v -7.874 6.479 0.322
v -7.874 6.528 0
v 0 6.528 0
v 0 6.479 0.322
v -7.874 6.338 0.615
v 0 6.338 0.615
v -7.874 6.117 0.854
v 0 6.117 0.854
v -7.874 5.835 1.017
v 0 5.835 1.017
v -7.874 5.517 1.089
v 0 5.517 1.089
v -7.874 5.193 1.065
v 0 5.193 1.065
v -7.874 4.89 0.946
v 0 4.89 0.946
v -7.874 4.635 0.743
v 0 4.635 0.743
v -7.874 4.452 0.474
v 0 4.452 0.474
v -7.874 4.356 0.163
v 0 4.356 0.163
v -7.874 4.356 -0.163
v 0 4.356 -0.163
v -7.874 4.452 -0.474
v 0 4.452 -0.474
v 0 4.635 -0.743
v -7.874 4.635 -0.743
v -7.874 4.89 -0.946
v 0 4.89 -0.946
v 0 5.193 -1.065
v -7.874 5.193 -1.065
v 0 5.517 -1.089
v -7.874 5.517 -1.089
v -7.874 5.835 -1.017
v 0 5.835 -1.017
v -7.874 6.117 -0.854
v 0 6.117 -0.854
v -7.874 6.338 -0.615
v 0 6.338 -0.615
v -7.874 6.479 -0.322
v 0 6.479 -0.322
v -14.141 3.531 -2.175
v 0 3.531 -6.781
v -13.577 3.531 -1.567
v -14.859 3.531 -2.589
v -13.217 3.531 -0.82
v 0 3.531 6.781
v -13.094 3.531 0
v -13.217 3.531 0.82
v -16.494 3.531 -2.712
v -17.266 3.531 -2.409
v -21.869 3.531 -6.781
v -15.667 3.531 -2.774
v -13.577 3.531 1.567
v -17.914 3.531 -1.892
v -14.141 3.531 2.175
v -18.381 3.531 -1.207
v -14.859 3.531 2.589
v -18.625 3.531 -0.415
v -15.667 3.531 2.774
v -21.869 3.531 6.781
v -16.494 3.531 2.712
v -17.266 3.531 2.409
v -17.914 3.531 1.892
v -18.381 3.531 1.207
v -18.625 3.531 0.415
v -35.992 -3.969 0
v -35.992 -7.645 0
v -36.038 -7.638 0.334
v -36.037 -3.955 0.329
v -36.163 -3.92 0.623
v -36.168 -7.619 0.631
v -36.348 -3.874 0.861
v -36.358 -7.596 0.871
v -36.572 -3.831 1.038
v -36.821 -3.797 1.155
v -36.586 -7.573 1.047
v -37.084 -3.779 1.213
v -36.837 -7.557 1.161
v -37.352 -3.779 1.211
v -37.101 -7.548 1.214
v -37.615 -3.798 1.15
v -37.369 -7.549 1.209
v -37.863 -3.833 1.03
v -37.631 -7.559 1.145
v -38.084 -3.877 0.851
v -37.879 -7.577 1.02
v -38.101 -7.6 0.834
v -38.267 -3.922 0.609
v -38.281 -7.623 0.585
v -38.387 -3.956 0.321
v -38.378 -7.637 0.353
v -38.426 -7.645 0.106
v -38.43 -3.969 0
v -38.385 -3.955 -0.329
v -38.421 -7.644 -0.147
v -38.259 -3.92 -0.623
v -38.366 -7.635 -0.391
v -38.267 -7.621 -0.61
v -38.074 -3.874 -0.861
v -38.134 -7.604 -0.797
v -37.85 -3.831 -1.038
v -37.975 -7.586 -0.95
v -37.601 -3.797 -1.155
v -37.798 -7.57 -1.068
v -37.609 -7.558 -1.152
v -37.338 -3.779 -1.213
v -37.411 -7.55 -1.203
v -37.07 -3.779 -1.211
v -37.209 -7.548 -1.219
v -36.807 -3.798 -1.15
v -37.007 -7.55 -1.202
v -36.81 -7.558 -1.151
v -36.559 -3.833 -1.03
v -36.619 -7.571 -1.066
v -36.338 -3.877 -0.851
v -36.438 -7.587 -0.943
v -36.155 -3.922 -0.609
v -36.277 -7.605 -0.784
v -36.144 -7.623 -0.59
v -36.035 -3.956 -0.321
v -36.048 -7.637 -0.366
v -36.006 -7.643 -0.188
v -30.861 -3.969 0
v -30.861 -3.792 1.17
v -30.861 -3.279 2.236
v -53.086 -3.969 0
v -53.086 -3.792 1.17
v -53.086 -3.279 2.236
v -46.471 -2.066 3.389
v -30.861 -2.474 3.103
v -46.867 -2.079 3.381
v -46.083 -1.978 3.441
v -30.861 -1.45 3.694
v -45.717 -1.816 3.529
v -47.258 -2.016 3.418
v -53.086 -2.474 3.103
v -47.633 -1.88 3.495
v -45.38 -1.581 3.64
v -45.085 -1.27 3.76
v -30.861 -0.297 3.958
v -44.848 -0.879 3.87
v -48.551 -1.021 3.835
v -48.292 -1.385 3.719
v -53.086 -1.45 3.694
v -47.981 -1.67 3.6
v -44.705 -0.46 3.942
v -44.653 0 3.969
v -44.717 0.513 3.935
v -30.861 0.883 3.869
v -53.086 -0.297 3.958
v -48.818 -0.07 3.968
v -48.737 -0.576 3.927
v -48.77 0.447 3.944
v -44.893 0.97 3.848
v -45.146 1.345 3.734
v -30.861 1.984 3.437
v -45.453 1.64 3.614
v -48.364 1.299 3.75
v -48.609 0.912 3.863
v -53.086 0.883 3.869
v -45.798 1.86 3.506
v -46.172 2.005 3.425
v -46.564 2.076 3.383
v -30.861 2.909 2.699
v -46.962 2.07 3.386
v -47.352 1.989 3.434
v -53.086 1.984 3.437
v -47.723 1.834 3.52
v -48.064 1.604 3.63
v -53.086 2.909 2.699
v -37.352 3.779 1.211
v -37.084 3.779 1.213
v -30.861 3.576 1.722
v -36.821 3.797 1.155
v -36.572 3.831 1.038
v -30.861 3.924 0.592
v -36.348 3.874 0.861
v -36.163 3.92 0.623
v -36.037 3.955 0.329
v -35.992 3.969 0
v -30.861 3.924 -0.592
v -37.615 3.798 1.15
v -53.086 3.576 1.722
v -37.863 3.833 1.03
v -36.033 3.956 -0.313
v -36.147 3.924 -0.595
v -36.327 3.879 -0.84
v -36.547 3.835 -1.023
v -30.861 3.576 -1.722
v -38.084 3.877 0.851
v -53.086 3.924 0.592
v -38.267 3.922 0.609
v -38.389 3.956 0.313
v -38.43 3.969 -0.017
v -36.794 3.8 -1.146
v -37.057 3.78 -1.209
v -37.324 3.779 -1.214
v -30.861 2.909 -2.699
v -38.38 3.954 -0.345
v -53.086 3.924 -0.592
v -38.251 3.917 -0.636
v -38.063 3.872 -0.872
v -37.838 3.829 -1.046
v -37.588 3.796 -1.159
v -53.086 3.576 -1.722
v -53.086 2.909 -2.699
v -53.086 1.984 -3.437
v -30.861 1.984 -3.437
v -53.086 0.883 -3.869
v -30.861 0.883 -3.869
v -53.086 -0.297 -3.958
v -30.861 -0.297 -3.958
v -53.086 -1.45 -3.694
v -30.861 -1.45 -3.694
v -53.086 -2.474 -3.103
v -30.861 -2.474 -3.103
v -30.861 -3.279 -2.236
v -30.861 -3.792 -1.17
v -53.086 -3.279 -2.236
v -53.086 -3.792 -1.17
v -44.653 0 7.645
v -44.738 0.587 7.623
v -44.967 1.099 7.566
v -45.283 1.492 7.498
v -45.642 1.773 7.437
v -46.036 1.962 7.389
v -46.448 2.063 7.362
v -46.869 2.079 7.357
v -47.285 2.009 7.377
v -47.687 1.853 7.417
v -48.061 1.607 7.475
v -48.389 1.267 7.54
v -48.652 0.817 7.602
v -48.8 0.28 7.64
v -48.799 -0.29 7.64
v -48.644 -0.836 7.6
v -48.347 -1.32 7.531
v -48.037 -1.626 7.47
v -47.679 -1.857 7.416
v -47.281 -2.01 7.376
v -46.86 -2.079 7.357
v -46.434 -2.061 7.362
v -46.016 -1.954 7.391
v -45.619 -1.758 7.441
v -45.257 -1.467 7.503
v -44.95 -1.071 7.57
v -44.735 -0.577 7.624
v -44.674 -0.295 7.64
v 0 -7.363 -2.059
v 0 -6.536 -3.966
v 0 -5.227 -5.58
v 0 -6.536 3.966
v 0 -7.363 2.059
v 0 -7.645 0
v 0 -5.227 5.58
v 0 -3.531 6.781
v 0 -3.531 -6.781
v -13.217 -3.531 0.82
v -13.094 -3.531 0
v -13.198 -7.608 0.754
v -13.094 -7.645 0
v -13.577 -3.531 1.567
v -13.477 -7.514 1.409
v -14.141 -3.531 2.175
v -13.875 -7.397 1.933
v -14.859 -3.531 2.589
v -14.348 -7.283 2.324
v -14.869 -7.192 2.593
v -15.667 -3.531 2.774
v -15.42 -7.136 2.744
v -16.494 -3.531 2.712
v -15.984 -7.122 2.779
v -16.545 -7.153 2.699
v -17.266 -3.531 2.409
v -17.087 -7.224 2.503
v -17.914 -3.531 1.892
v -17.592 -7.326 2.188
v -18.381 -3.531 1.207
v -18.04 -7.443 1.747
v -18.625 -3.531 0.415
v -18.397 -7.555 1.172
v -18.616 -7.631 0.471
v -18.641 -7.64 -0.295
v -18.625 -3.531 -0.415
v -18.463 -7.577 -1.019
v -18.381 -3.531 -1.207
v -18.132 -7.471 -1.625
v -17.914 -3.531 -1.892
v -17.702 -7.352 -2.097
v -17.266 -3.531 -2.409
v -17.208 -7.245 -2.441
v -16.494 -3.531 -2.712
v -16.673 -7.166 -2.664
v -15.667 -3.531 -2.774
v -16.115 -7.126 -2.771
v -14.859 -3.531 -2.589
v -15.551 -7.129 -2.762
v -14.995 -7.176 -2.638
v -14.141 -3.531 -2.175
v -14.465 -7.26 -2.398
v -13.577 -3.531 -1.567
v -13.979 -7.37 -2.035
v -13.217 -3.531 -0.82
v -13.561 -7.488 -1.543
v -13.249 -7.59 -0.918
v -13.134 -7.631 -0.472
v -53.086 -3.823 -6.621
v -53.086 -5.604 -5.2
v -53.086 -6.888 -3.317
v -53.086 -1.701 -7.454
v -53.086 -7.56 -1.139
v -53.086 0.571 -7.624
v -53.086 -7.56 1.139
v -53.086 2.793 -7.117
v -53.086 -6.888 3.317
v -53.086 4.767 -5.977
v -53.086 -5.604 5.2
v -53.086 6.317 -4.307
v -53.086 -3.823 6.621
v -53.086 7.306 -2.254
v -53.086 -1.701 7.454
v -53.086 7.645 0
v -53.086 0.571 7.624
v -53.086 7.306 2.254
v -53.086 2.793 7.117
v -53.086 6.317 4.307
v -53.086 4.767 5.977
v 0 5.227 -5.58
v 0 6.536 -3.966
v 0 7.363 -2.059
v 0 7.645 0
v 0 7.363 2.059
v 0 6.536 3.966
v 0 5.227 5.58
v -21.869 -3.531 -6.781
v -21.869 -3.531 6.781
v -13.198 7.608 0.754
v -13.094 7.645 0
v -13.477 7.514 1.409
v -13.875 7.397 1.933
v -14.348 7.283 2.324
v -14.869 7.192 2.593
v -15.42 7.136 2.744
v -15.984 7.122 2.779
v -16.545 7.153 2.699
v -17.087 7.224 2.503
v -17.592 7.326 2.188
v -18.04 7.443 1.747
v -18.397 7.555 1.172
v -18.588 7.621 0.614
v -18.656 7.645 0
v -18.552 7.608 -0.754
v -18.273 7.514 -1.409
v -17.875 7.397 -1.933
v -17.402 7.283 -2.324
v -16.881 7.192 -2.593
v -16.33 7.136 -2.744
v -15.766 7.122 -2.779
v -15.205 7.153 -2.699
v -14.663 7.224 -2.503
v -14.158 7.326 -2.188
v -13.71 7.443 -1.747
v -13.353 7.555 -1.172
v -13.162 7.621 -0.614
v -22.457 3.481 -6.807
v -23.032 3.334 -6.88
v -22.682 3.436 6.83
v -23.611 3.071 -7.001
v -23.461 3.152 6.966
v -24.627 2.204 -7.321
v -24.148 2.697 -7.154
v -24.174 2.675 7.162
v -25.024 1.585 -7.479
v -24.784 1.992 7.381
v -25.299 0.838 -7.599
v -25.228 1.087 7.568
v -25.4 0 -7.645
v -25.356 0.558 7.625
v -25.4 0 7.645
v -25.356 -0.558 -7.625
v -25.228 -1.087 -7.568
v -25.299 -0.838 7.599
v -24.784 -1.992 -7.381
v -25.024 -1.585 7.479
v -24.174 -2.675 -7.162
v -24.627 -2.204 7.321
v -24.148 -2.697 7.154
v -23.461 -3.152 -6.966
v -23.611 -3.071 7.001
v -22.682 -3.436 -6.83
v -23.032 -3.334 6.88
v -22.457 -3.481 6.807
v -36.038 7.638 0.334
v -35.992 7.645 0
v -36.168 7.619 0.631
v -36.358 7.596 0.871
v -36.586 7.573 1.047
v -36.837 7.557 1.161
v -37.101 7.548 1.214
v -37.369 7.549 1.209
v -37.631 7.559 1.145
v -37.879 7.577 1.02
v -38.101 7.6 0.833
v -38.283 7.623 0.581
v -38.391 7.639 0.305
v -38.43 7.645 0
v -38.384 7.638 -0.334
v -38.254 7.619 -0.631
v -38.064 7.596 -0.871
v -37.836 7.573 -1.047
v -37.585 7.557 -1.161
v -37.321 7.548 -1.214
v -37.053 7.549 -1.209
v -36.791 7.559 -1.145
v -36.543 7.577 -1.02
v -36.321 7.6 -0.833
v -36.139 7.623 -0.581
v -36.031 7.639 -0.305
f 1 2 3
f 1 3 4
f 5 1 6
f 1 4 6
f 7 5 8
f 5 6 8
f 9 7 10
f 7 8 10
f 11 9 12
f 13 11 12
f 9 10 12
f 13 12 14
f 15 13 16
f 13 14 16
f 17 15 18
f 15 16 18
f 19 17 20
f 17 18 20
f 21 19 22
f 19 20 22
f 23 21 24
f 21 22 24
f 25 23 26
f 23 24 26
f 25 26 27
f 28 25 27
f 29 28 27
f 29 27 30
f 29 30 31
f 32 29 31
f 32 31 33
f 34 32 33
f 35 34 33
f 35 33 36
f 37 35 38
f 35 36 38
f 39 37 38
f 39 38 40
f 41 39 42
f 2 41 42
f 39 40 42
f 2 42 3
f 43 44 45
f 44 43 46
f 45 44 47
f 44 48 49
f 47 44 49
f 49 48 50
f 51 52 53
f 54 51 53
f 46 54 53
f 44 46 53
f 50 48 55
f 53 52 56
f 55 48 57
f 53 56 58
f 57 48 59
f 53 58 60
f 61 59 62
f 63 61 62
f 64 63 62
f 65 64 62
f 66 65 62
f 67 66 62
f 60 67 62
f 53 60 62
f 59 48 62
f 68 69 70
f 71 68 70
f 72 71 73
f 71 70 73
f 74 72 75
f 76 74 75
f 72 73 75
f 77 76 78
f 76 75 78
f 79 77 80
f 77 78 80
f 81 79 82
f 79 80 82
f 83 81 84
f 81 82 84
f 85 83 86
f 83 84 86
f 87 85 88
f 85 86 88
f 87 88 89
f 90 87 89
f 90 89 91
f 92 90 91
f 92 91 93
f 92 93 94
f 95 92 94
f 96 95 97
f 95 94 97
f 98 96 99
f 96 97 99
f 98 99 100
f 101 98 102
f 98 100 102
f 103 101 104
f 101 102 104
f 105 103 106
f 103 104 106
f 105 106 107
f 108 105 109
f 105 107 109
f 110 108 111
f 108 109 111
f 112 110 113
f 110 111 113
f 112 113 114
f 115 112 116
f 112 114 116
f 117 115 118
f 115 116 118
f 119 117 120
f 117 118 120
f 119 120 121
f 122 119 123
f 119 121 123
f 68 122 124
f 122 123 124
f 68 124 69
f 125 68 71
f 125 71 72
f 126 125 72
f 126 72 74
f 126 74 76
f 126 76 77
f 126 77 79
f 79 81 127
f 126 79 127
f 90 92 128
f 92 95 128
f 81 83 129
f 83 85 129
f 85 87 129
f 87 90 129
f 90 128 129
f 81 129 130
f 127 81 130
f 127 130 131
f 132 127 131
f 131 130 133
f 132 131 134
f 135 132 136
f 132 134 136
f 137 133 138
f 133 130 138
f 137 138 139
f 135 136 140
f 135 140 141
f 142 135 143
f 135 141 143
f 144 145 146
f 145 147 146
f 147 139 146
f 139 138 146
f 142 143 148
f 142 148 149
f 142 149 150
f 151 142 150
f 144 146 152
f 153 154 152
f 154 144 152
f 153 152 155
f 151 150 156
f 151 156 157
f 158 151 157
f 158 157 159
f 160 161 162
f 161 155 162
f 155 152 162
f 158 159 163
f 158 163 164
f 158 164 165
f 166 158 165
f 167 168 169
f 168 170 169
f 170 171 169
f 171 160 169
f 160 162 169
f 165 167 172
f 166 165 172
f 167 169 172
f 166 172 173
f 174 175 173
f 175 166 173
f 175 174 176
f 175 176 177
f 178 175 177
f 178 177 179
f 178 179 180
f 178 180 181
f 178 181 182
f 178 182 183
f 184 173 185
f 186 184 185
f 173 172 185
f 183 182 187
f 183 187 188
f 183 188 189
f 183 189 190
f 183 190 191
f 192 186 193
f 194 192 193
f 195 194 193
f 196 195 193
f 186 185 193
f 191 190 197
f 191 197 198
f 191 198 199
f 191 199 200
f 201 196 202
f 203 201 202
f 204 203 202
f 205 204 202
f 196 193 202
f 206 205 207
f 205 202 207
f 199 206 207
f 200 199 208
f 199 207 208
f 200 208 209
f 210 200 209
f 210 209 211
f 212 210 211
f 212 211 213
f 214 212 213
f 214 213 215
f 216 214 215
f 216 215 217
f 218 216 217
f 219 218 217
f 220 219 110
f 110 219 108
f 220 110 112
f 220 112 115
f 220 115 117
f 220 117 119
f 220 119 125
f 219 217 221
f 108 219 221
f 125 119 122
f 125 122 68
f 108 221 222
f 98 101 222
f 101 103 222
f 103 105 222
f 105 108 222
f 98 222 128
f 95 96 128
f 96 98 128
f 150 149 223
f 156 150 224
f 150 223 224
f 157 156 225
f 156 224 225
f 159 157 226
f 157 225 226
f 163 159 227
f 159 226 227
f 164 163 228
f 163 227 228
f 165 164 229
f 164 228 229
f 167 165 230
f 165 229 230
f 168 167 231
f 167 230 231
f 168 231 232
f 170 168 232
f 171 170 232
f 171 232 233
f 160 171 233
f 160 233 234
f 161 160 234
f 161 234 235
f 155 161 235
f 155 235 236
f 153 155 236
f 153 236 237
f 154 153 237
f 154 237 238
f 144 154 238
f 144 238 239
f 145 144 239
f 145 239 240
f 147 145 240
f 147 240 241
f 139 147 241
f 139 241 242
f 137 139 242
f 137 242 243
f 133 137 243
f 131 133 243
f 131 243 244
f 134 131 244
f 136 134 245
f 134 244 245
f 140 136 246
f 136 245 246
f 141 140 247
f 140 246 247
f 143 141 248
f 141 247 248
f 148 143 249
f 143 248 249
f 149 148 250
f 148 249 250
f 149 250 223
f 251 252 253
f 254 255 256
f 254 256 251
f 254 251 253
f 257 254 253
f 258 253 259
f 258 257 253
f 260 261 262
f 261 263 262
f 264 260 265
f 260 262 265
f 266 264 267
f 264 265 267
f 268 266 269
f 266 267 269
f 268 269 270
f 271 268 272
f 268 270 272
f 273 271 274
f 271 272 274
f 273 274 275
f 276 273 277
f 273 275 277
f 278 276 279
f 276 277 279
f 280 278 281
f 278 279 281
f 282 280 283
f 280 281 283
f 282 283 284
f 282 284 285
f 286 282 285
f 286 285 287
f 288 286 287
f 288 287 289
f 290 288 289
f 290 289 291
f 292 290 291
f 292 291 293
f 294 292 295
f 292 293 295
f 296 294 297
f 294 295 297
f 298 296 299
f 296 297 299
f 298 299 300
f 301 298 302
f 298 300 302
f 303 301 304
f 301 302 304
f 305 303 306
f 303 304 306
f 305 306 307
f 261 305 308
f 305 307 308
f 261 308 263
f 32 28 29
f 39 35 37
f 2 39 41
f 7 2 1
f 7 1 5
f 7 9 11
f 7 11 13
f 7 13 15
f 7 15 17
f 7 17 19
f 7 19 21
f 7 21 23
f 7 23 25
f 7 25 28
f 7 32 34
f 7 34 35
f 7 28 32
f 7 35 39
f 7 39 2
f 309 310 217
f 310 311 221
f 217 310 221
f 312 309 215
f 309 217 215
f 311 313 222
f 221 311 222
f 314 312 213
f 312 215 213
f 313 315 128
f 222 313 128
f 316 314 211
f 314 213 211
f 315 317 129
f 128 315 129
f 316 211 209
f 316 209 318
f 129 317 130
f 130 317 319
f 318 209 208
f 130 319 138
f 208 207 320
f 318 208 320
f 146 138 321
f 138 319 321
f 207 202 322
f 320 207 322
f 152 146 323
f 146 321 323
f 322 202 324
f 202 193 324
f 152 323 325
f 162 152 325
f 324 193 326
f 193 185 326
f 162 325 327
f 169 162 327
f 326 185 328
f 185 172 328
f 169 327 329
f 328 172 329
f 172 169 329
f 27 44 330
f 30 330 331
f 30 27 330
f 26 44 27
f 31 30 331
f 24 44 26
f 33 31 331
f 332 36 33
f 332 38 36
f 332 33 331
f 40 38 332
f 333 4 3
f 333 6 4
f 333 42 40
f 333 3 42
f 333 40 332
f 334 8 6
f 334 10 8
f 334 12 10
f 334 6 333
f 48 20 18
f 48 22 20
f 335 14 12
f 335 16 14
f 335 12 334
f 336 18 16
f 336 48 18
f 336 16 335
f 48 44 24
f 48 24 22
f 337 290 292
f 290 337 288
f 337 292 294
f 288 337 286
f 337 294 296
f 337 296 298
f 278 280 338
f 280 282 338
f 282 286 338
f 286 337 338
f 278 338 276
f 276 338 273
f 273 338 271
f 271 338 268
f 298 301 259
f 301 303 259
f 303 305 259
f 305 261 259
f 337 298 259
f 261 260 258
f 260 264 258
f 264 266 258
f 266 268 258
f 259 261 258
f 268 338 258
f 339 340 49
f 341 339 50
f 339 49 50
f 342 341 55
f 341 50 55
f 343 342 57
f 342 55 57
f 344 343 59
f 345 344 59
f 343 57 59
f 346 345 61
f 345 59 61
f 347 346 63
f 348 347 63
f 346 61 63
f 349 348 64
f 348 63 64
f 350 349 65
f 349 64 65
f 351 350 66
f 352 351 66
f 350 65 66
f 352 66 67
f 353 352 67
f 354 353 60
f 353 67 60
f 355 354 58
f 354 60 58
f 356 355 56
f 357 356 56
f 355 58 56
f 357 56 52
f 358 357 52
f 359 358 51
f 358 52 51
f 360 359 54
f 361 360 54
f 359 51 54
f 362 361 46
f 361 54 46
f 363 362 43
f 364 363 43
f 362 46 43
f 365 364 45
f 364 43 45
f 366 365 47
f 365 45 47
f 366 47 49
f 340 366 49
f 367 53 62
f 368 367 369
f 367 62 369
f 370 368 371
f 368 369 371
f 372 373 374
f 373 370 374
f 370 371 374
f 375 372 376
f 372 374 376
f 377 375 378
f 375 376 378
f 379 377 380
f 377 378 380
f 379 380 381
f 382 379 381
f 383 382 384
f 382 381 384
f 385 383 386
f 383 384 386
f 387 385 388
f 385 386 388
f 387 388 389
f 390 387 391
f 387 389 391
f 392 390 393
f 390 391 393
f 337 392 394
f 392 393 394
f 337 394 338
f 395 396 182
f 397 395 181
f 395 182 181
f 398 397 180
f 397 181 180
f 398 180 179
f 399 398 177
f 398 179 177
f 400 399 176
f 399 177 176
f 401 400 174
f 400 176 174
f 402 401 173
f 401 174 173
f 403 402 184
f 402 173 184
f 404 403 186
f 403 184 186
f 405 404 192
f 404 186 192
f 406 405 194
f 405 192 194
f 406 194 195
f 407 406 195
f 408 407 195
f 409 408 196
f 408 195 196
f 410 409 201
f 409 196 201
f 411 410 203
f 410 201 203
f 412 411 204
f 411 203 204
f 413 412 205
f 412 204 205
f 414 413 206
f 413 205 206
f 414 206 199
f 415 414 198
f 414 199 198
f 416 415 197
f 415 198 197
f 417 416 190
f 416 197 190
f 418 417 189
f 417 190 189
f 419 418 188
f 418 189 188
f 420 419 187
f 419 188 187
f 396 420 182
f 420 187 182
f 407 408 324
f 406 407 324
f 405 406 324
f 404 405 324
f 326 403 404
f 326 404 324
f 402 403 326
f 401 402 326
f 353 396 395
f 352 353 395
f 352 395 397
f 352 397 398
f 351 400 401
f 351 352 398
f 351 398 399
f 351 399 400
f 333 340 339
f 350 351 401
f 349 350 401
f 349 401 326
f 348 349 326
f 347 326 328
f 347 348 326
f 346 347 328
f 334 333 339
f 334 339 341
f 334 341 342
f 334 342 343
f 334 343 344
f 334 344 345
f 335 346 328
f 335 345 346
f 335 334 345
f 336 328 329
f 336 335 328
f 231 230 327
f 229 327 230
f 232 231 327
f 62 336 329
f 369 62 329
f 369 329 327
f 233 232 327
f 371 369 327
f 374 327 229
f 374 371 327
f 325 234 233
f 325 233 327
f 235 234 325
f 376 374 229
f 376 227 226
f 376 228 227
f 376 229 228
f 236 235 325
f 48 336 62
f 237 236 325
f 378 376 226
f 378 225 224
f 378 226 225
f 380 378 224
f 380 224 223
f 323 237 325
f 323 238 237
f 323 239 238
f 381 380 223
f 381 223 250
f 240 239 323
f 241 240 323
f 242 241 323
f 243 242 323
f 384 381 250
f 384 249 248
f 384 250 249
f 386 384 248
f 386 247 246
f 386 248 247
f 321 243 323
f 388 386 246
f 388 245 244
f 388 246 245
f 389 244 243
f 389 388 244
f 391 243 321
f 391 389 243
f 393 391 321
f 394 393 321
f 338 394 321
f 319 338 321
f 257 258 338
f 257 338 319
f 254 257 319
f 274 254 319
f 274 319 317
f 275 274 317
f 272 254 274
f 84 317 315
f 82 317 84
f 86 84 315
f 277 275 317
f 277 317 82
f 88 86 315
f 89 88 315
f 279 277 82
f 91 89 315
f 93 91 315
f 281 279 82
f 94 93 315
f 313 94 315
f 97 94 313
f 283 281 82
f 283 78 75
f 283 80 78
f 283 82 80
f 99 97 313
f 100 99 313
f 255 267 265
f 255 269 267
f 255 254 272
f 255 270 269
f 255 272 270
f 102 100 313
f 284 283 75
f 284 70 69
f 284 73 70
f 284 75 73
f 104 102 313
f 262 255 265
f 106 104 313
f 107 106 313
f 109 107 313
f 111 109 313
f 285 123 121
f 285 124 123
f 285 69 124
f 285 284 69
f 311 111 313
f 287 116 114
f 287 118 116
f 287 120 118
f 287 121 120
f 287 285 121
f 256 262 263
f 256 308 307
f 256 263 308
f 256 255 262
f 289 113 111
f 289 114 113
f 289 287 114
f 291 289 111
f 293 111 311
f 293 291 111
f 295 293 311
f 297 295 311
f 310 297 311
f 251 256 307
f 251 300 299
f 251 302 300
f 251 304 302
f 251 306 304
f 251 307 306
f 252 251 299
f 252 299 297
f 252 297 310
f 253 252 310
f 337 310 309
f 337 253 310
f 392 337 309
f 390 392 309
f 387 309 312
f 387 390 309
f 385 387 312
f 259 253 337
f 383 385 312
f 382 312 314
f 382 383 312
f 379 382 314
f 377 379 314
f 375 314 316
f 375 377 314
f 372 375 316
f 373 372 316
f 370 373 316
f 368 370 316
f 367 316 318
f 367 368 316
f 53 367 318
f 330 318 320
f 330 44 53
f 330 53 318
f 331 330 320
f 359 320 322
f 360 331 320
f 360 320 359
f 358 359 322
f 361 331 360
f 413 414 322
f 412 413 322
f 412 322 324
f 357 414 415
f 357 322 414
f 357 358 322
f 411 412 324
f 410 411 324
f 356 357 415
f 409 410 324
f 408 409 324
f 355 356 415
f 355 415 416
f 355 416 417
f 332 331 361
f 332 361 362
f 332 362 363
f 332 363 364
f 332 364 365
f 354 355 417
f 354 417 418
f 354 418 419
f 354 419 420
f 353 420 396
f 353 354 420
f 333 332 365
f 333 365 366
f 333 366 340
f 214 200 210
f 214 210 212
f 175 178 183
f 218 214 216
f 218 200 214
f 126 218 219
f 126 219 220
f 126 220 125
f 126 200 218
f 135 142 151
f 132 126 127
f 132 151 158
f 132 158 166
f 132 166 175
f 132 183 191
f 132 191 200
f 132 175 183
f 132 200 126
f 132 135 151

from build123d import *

# Parameters (mm, degrees)
F0_R      = 7.6454
F1_DEPTH  = 53.086
F4_DEPTH  = 15.5204
F5_R      = 3.96875
F6_DEPTH  = 22.225
F7_R      = 2.0828
F8_DEPTH  = 7.62
F9_R      = 1.0922
F10_DEPTH = 7.874
F12_R     = 2.7813
F13_DEPTH = 15.5204
F14_R     = 1.2192
F15_DEPTH = 15.5204


with BuildPart() as f1:
    # F0 (on Right) → F1 (new body)
    with BuildSketch(Plane.YZ):
        Circle(F0_R)
    extrude(amount=-F1_DEPTH)

    # F3 (on offset) → F4 (cut, through all)
    with BuildSketch(Plane.XY.offset(7.874)):
        with BuildLine():
            Line((25.4, 3.5306), (-21.8694, 3.5306))
            ThreePointArc((-21.8694, 3.5306), (-24.365911, 2.496511), (-25.4, 0))
            ThreePointArc((-25.4, 0), (-24.365911, -2.496511), (-21.8694, -3.5306))
            Line((-21.8694, -3.5306), (25.4, -3.5306))
            Line((25.4, -3.5306), (25.4, 3.5306))
        make_face()
    extrude(amount=-F4_DEPTH, mode=Mode.SUBTRACT)

    # F5 (on face) → F6 (cut)
    with BuildSketch(Plane(origin=(-53.086, 0, 0), x_dir=(0, -1, 0), z_dir=(-1, 0, 0))):
        Circle(F5_R)
    extrude(amount=-F6_DEPTH, mode=Mode.SUBTRACT)

    # F7 (on offset) → F8 (cut)
    with BuildSketch(Plane.XY.offset(7.874)):
        with Locations((-46.736, 0)):
            Circle(F7_R)
    extrude(amount=-F8_DEPTH, mode=Mode.SUBTRACT)

    # F9 (on face) → F10 (cut)
    with BuildSketch(Plane.YZ):
        with Locations((5.4356, 0)):
            Circle(F9_R)
    extrude(amount=-F10_DEPTH, mode=Mode.SUBTRACT)

    # F12 (on offset) → F13 (cut, through all)
    with BuildSketch(Plane.XZ.offset(7.874)):
        with Locations((-15.875, 0)):
            Circle(F12_R)
    extrude(amount=-F13_DEPTH, mode=Mode.SUBTRACT)

    # F14 (on offset) → F15 (cut, through all)
    with BuildSketch(Plane.XZ.offset(7.874)):
        with Locations((-37.211, 0)):
            Circle(F14_R)
    extrude(amount=-F15_DEPTH, mode=Mode.SUBTRACT)


solid = f1.part
